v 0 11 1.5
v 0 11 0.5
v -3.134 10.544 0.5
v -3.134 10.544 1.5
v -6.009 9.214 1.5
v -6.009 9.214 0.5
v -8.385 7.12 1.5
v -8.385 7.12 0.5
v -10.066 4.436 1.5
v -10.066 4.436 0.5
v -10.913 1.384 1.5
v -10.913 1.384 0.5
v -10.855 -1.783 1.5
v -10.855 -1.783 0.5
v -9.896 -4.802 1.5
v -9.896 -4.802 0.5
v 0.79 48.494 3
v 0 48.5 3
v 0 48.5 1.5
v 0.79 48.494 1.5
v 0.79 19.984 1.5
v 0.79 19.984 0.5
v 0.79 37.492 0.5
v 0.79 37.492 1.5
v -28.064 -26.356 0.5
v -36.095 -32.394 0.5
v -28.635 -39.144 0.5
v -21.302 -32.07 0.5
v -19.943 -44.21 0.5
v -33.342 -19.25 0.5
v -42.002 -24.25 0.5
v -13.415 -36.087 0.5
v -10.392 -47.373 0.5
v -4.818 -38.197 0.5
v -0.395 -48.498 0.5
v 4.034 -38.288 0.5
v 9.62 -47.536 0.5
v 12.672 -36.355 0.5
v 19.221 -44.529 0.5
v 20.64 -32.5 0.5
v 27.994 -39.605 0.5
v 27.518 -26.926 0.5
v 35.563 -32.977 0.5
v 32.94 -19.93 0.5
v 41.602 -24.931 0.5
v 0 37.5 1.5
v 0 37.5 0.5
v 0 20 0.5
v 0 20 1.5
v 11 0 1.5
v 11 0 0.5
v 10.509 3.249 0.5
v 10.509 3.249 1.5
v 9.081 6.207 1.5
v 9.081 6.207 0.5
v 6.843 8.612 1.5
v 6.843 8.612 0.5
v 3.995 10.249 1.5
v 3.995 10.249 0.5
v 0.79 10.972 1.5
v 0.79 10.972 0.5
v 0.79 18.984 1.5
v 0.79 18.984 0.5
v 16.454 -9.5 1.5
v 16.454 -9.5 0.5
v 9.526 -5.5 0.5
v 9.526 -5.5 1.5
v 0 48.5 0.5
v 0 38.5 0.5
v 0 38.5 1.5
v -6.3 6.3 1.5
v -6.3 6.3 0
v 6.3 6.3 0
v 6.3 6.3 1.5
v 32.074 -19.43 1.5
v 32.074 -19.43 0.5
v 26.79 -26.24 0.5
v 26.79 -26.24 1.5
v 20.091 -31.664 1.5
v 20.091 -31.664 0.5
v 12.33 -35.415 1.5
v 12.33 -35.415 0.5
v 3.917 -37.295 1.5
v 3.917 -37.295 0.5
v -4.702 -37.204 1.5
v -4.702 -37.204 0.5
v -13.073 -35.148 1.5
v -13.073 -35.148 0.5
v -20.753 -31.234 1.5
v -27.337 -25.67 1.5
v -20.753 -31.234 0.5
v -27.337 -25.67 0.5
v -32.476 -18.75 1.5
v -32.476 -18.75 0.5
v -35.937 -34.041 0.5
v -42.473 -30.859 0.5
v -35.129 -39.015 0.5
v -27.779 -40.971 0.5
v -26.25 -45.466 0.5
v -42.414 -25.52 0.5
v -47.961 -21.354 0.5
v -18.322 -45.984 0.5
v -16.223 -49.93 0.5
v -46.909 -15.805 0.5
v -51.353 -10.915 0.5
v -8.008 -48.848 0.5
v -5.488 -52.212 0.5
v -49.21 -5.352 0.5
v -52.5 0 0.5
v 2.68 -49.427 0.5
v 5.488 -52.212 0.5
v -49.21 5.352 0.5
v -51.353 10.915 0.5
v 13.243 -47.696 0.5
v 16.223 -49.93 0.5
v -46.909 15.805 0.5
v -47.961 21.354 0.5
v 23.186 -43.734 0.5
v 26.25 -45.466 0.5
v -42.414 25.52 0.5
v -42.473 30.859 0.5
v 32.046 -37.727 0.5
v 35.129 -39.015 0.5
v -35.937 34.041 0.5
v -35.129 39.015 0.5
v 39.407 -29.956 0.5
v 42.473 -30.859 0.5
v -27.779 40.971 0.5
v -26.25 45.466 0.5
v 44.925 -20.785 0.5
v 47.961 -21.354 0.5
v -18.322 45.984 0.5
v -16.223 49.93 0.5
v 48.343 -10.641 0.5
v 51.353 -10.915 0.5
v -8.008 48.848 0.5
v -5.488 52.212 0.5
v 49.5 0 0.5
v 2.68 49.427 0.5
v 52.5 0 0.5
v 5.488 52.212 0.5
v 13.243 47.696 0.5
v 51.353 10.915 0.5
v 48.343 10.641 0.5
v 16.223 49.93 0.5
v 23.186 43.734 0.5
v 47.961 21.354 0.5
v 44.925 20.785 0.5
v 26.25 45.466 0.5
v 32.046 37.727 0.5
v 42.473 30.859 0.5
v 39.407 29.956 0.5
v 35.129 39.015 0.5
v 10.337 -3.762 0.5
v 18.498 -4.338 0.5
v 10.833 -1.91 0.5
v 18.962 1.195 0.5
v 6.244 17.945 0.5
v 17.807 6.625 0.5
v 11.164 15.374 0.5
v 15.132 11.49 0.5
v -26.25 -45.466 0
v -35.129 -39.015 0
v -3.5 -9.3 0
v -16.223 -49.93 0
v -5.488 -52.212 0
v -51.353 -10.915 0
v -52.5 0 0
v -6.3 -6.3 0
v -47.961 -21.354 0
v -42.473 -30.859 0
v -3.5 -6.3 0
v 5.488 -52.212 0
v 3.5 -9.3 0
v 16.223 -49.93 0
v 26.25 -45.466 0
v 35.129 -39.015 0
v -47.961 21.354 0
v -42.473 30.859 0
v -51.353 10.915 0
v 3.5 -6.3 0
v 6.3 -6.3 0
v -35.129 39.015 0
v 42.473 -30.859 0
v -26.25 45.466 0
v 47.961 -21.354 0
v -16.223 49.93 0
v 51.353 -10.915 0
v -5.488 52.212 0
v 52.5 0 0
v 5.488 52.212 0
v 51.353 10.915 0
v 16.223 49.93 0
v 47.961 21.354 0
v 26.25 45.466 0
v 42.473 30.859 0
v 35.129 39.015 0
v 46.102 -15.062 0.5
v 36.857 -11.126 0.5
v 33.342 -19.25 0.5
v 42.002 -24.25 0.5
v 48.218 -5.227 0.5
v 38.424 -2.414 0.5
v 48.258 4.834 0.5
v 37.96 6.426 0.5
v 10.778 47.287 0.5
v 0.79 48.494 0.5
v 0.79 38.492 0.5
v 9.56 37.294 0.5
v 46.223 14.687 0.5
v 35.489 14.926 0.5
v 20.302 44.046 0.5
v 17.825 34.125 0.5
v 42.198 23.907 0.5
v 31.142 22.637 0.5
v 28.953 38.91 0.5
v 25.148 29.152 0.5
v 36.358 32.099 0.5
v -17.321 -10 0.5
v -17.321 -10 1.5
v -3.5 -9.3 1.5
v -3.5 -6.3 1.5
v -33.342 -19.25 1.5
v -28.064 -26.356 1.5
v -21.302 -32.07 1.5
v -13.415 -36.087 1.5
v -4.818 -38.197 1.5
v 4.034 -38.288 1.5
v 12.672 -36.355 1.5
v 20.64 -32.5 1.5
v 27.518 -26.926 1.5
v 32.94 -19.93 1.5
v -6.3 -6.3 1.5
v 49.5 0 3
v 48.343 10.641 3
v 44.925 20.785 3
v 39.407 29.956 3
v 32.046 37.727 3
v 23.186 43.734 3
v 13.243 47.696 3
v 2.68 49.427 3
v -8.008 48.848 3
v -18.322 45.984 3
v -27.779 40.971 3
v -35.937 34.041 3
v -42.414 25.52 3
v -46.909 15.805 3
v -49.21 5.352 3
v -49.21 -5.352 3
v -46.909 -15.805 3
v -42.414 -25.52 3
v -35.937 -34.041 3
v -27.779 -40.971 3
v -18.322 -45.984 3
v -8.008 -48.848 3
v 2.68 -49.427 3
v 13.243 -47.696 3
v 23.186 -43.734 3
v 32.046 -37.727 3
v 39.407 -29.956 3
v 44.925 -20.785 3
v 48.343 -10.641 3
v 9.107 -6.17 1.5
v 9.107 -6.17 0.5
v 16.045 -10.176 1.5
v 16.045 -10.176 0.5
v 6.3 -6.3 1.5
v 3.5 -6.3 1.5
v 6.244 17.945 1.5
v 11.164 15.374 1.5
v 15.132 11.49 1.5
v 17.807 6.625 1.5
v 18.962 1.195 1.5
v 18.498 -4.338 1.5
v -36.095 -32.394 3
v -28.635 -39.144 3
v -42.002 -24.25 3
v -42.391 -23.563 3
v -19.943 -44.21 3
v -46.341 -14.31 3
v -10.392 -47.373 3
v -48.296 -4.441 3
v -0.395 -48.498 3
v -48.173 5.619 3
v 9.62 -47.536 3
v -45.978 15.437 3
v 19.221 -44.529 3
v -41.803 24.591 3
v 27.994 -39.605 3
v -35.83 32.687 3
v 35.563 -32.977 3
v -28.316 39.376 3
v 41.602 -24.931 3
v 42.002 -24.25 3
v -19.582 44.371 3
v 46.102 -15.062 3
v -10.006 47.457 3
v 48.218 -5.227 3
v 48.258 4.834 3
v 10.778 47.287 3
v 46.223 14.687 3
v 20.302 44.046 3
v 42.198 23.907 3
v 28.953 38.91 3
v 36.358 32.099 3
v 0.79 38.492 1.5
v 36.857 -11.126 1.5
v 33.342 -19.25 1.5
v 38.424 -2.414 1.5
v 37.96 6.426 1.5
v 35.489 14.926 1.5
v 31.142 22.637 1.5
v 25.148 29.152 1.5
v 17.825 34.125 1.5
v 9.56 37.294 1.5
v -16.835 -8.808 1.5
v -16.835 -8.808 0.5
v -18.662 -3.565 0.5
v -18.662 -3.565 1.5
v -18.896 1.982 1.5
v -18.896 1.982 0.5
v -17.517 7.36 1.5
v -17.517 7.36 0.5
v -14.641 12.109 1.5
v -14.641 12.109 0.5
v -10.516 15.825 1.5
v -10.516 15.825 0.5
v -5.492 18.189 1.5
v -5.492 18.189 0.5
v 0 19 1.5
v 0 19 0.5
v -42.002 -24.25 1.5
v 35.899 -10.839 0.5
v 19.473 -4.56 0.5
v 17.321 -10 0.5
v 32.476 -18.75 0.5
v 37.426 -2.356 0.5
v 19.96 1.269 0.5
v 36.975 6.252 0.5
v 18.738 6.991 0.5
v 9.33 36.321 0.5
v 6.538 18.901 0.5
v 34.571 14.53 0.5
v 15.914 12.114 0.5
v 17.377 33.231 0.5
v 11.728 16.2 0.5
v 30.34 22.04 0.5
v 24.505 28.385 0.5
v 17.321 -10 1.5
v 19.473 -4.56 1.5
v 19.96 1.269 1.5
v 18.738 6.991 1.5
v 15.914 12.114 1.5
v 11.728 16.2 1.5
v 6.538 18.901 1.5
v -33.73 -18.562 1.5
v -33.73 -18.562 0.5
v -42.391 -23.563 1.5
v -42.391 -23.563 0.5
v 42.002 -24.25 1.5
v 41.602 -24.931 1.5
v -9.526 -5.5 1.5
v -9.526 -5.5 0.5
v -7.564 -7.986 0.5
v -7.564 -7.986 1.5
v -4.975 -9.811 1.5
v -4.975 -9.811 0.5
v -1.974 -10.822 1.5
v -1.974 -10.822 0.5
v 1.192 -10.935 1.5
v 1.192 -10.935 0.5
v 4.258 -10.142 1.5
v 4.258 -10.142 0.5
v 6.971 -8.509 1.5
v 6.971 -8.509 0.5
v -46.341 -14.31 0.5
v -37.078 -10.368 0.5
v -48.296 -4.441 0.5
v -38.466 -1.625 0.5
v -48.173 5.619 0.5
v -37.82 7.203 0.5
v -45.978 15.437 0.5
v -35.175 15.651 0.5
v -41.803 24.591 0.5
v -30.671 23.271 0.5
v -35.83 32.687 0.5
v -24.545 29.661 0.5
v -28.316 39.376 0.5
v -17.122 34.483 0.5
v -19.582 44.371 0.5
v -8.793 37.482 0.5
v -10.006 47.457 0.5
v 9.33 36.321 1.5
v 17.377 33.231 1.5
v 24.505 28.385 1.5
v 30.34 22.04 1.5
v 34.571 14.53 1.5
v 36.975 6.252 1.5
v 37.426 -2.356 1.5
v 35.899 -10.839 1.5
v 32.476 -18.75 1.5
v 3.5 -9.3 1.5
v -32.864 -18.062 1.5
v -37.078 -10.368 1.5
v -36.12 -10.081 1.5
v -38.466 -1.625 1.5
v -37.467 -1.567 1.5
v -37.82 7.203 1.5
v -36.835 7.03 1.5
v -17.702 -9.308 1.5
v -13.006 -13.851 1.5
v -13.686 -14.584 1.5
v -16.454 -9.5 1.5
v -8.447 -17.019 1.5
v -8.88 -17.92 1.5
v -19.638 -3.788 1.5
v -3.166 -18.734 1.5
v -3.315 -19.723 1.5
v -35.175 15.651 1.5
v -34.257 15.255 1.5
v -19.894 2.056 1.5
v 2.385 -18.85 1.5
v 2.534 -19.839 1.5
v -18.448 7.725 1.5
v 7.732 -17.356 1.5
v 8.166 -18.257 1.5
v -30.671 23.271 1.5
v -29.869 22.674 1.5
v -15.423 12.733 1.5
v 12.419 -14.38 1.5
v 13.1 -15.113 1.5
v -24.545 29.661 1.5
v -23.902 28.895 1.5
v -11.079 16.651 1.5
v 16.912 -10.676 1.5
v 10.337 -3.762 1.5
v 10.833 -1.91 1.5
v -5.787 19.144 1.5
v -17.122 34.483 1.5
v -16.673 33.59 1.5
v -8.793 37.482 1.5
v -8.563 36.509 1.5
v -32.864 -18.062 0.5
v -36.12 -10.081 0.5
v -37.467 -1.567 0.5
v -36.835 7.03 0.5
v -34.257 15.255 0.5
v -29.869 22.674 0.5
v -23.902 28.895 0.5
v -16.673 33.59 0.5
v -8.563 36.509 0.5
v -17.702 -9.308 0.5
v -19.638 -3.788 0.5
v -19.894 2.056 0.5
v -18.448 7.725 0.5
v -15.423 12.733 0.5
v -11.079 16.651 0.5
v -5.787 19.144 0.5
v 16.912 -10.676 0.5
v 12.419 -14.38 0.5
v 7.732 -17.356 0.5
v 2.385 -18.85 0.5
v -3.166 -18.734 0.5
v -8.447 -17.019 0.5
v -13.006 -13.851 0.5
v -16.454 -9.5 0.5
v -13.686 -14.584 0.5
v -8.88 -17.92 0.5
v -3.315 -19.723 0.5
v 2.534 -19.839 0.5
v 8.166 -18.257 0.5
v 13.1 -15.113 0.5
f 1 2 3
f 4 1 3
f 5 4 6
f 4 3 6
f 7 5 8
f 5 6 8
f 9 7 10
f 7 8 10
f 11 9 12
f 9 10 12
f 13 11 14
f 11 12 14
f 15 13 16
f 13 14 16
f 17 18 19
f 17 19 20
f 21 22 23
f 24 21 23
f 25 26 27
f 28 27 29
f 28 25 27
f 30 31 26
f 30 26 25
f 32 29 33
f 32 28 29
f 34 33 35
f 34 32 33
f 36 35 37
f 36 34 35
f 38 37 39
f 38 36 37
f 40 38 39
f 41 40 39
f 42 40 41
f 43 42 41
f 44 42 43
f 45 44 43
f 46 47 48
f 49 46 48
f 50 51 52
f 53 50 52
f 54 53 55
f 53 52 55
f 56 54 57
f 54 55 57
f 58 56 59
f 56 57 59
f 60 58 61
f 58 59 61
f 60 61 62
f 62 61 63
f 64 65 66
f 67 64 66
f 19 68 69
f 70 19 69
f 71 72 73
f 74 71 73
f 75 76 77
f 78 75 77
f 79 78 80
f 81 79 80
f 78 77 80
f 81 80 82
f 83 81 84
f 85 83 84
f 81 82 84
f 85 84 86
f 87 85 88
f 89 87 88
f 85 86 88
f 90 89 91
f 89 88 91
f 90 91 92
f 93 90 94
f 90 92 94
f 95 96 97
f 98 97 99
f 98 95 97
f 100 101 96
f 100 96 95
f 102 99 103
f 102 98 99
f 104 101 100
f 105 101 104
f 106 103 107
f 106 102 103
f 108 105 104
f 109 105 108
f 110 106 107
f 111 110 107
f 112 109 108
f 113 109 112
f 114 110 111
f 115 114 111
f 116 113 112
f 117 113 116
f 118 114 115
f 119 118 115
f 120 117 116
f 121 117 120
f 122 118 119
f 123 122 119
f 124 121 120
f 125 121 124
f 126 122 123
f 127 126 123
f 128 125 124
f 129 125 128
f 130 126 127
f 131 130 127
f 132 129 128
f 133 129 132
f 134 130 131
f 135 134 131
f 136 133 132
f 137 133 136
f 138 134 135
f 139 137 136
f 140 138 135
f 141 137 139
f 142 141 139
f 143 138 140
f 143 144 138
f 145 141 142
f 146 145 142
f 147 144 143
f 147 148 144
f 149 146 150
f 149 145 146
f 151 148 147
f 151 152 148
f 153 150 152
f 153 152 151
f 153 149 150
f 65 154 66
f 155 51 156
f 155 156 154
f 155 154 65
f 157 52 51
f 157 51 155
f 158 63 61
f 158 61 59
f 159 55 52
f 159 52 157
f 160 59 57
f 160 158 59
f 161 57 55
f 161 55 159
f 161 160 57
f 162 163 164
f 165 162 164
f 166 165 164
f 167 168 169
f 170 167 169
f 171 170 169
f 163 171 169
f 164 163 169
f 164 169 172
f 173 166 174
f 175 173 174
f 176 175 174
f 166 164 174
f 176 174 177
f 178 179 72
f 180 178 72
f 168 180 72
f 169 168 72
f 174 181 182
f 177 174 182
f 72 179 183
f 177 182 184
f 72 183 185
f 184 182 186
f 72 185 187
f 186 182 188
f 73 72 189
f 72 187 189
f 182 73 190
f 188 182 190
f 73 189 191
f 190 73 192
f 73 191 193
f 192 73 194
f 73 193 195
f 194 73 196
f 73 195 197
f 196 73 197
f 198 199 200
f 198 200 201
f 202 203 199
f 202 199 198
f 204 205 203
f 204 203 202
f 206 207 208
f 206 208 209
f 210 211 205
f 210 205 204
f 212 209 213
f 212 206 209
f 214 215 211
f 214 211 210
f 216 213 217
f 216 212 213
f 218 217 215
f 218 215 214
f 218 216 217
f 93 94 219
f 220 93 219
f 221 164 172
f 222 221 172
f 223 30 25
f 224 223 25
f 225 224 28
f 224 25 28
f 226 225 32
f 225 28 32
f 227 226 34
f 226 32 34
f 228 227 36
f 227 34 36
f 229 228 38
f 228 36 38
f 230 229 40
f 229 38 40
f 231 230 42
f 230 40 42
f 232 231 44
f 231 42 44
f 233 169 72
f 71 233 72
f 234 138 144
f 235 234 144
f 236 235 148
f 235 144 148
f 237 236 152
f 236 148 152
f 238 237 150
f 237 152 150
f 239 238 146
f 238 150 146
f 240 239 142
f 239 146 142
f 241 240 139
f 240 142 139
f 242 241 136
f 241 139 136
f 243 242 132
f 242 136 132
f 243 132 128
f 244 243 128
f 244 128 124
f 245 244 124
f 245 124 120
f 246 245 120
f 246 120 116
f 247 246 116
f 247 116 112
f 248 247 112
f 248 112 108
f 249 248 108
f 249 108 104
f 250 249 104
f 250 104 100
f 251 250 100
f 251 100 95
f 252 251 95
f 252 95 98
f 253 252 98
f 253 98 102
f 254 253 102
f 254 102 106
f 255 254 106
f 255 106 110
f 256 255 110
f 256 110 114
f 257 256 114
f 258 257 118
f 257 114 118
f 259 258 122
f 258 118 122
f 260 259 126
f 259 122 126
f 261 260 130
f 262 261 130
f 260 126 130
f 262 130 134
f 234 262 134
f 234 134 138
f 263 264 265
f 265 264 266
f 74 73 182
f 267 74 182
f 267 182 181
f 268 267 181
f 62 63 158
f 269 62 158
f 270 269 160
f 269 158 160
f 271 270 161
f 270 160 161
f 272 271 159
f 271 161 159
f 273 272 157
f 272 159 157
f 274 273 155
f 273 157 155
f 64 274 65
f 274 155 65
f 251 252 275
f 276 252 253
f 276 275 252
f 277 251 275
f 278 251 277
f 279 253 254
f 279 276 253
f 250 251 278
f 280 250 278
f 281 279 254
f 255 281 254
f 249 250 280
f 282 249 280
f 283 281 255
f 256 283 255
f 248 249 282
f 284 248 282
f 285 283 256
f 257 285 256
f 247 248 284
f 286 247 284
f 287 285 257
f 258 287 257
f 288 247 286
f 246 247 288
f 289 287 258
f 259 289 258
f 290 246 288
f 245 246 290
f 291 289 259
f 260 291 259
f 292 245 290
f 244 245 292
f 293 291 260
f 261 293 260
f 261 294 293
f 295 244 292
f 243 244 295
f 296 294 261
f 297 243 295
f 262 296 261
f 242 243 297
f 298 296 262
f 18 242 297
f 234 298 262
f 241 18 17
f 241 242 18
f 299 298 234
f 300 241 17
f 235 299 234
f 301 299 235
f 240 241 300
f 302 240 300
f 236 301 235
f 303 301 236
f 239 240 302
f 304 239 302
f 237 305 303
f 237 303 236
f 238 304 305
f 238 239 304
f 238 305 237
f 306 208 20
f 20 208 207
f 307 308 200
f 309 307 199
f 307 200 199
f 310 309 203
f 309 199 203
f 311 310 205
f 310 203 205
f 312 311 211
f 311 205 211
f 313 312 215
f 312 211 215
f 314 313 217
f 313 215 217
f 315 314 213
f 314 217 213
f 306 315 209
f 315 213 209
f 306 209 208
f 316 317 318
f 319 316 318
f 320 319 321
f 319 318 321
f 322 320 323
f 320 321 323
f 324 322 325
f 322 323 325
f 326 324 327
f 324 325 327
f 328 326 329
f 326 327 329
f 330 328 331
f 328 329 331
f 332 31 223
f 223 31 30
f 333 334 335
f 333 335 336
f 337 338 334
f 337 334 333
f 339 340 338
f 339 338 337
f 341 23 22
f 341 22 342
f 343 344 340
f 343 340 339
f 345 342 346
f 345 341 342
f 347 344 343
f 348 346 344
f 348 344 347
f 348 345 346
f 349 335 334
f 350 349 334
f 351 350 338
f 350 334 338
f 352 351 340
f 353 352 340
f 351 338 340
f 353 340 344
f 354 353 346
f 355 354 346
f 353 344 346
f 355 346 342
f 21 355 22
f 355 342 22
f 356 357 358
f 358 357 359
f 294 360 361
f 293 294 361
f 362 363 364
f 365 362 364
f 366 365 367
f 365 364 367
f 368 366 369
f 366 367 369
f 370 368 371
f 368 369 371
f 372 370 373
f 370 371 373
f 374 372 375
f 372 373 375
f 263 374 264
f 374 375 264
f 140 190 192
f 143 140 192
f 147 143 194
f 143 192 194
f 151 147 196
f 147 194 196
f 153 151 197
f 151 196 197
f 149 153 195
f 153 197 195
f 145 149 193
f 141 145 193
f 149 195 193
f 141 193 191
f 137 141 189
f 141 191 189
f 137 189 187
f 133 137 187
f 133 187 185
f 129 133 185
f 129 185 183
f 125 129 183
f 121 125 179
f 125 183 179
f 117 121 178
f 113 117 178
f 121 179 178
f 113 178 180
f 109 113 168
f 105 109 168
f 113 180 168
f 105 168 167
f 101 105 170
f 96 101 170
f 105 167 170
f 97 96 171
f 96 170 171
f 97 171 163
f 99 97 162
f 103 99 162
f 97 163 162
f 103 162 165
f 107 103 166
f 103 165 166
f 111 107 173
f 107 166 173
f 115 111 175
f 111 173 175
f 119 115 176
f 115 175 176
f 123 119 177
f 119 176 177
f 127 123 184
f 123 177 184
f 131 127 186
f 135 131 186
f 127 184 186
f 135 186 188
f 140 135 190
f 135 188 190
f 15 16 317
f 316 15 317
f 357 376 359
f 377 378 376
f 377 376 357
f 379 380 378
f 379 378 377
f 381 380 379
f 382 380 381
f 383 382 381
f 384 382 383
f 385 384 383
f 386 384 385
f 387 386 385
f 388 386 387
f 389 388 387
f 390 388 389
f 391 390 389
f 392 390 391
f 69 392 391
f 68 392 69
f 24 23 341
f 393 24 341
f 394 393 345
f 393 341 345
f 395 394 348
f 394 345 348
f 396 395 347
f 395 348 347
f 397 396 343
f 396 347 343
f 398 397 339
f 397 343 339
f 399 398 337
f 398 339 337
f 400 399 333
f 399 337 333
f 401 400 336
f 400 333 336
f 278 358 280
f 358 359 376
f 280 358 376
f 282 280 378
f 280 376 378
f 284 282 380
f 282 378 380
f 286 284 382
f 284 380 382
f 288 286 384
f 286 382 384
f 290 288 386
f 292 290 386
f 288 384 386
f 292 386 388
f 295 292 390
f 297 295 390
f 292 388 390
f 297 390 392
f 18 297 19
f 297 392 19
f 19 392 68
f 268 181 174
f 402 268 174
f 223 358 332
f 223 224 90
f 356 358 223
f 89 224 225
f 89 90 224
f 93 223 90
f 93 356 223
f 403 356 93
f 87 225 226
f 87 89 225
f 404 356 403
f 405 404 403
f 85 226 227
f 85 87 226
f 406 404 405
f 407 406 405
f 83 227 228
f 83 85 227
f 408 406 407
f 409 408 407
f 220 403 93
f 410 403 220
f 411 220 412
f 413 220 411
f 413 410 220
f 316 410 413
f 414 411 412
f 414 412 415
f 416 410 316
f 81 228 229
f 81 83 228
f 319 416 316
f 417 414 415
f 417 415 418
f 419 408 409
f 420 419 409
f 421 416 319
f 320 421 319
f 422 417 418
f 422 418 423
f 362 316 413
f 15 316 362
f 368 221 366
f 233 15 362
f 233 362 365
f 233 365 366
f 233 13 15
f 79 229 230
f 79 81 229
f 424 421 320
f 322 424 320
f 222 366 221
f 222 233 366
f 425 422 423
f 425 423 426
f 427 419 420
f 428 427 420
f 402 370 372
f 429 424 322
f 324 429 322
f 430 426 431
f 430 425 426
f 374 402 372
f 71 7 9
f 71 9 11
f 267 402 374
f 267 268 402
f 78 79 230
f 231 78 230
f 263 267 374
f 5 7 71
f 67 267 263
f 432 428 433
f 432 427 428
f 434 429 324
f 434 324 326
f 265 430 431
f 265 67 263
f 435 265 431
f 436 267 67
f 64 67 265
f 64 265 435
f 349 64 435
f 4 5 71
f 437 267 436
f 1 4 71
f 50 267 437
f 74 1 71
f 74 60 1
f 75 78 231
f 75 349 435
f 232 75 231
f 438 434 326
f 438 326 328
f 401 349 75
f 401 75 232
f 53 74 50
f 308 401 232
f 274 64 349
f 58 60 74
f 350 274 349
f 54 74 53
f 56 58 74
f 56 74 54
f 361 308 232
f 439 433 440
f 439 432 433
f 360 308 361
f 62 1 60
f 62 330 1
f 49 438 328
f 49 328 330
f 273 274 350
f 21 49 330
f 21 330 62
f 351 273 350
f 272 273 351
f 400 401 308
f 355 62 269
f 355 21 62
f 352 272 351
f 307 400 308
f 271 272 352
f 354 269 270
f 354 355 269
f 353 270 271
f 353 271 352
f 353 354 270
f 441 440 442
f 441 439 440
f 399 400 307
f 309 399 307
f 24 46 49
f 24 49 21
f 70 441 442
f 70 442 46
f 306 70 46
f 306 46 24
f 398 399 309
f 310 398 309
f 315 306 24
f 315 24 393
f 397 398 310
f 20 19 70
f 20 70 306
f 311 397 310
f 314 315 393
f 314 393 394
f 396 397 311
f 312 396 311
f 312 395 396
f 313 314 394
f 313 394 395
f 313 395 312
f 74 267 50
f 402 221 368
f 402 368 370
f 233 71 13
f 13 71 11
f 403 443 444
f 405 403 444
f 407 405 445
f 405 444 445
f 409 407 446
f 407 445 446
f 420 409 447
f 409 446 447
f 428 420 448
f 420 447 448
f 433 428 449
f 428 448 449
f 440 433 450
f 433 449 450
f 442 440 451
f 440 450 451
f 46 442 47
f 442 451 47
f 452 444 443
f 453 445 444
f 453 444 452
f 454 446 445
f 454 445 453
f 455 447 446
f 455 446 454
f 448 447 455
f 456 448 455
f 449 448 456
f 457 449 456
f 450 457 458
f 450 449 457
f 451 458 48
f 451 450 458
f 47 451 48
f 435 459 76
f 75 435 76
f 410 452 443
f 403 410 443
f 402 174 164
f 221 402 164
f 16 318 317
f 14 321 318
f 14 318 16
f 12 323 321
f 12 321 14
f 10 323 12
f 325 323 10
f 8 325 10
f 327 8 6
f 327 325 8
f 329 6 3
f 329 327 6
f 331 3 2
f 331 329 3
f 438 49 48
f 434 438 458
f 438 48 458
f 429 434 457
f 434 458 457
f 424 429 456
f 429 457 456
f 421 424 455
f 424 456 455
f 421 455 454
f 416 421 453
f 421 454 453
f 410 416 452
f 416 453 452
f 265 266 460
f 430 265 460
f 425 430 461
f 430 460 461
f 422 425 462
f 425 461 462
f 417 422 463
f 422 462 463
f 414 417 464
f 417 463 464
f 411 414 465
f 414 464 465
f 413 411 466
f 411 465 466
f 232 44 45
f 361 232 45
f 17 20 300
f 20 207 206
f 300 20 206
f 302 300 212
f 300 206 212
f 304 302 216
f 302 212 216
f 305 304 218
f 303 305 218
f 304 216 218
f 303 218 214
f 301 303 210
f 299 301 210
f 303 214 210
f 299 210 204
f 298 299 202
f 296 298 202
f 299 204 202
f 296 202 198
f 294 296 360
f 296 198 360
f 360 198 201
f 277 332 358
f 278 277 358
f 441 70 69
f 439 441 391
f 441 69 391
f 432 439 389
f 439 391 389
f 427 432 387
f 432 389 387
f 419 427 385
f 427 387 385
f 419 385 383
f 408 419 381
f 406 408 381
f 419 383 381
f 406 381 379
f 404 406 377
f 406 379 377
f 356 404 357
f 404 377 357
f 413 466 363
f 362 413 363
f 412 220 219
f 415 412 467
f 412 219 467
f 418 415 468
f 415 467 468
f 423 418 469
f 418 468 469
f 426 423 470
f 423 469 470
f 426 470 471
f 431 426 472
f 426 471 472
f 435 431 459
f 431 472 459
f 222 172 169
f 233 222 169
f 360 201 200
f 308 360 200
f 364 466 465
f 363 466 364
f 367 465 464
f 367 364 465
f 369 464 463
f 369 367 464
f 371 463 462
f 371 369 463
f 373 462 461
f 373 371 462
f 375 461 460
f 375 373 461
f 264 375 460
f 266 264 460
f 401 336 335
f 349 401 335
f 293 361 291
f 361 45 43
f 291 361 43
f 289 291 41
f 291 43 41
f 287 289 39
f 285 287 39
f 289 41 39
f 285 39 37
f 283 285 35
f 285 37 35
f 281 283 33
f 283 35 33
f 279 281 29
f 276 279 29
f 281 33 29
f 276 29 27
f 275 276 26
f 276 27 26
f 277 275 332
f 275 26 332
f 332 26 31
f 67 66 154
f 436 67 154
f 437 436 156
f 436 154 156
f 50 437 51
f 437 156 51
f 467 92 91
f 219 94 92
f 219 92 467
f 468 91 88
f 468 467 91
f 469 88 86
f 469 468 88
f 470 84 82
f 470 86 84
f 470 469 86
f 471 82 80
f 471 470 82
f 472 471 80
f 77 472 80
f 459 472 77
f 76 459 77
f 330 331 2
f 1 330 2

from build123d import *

# Parameters (mm, degrees)
F0_R     = 52.5
F0_R_2   = 49.5
F1_DEPTH = 0.5
F2_DEPTH = 3
F3_DEPTH = 1.5


# Not quite as in the source:
# - a feature names something its author has since deleted; it is built from what else it names


with BuildPart() as f1:
    # F0 (on Top) → F1 (new body)
    with BuildSketch(Plane.XY):
        Circle(F0_R)
        Circle(F0_R_2, mode=Mode.SUBTRACT)
        Circle(F0_R_2)
        with BuildLine():
            ThreePointArc((-42.3914543736, -23.5629920869), (-41.8034395488, 24.5911049344), (0, 48.5))
            Line((0, 48.5), (0.7895774504, 48.4935724344))
            ThreePointArc((0.7895774504, 48.4935724344), (42.1982413547, 23.9072881476), (42.0022320835, -24.25))
            Line((42.0022320835, -24.25), (41.6018769232, -24.9305803475))
            ThreePointArc((41.6018769232, -24.9305803475), (-0.3948018059, -48.498393082), (-42.0022320835, -24.25))
            Line((-42.0022320835, -24.25), (-42.3914543736, -23.5629920869))
        make_face(mode=Mode.SUBTRACT)
        with BuildLine():
            Line((0.7895774504, 48.4935724344), (0, 48.5))
            Line((0, 48.5), (0, 38.5))
            ThreePointArc((0, 38.5), (-33.1428201233, 19.5909028448), (-33.7297542357, -18.5621571806))
            Line((-33.7297542357, -18.5621571806), (-42.3914543736, -23.5629920869))
            Line((-42.3914543736, -23.5629920869), (-42.0022320835, -24.25))
            Line((-42.0022320835, -24.25), (-33.3419780457, -19.25))
            ThreePointArc((-33.3419780457, -19.25), (-0.394809485, -38.4979756022), (32.9401767853, -19.9297454412))
            Line((32.9401767853, -19.9297454412), (41.6018769232, -24.9305803475))
            Line((41.6018769232, -24.9305803475), (42.0022320835, -24.25))
            Line((42.0022320835, -24.25), (33.3419780457, -19.25))
            ThreePointArc((33.3419780457, -19.25), (33.5376296083, 18.9070727575), (0.7895774504, 38.4919026218))
            Line((0.7895774504, 38.4919026218), (0.7895774504, 48.4935724344))
        make_face()
        with BuildLine():
            ThreePointArc((32.0739643397, -19.4296374526), (-0.3948106071, -37.4979216035), (-32.4759526419, -18.75))
            Line((-32.4759526419, -18.75), (-17.3205080757, -10))
            ThreePointArc((-17.3205080757, -10), (-0.3948656915, -19.9961016472), (16.9122163764, -10.6759981846))
            Line((16.9122163764, -10.6759981846), (32.0739643397, -19.4296374526))
        make_face(mode=Mode.SUBTRACT)
        with BuildLine():
            Line((-17.7017938268, -9.308409924), (-32.8635417901, -18.0620491919))
            ThreePointArc((-32.8635417901, -18.0620491919), (-32.2767473942, 19.0908768172), (0, 37.5))
            Line((0, 37.5), (0, 20))
            ThreePointArc((0, 20), (-17.1196991574, 10.3400145435), (-17.7017938268, -9.308409924))
        make_face(mode=Mode.SUBTRACT)
        with BuildLine():
            ThreePointArc((0, 11), (0.3950435606, 10.9929041015), (0.7895774504, 10.971625561))
            Line((0.7895774504, 10.971625561), (0.7895774504, 18.983586791))
            ThreePointArc((0.7895774504, 18.983586791), (16.6483657305, 9.155977201), (16.4544826719, -9.5))
            Line((16.4544826719, -9.5), (9.5262794416, -5.5))
            ThreePointArc((9.5262794416, -5.5), (9.322612433, -5.8385698098), (9.1069177314, -6.1696069108))
            Line((9.1069177314, -6.1696069108), (16.0454796907, -10.1755875258))
            ThreePointArc((16.0454796907, -10.1755875258), (-0.3948740127, -18.9958962546), (-16.4544826719, -9.5))
            Line((-16.4544826719, -9.5), (-9.5262794416, -5.5))
            ThreePointArc((-9.5262794416, -5.5), (-9.7176559936, -5.1543342917), (-9.8964951818, -4.8020186502))
            Line((-9.8964951818, -4.8020186502), (-16.8350571411, -8.8079992652))
            ThreePointArc((-16.8350571411, -8.8079992652), (-16.2534917178, 9.8399190536), (0, 19))
            Line((0, 19), (0, 11))
        make_face(mode=Mode.SUBTRACT)
        with BuildLine():
            Line((32.4759526419, -18.75), (17.3205080757, -10))
            ThreePointArc((17.3205080757, -10), (17.5145648489, 9.6560871037), (0.7895774504, 19.9844081086))
            Line((0.7895774504, 19.9844081086), (0.7895774504, 37.4916866445))
            ThreePointArc((0.7895774504, 37.4916866445), (32.6715580013, 18.4070447863), (32.4759526419, -18.75))
        make_face(mode=Mode.SUBTRACT)
        with BuildLine():
            Line((-17.3205080757, -10), (-32.4759526419, -18.75))
            ThreePointArc((-32.4759526419, -18.75), (-0.3948106071, -37.4979216035), (32.0739643397, -19.4296374526))
            Line((32.0739643397, -19.4296374526), (16.9122163764, -10.6759981846))
            ThreePointArc((16.9122163764, -10.6759981846), (-0.3948656915, -19.9961016472), (-17.3205080757, -10))
        make_face()
        with BuildLine():
            ThreePointArc((0, 37.5), (-32.2767473942, 19.0908768172), (-32.8635417901, -18.0620491919))
            Line((-32.8635417901, -18.0620491919), (-17.7017938268, -9.308409924))
            ThreePointArc((-17.7017938268, -9.308409924), (-17.1196991574, 10.3400145435), (0, 20))
            Line((0, 20), (0, 37.5))
        make_face()
        with BuildLine():
            ThreePointArc((0.7895774504, 19.9844081086), (17.5145648489, 9.6560871037), (17.3205080757, -10))
            Line((17.3205080757, -10), (32.4759526419, -18.75))
            ThreePointArc((32.4759526419, -18.75), (32.6715580013, 18.4070447863), (0.7895774504, 37.4916866445))
            Line((0.7895774504, 37.4916866445), (0.7895774504, 19.9844081086))
        make_face()
        with BuildLine():
            Line((0, 38.5), (0, 48.5))
            ThreePointArc((0, 48.5), (-41.8034395488, 24.5911049344), (-42.3914543736, -23.5629920869))
            Line((-42.3914543736, -23.5629920869), (-33.7297542357, -18.5621571806))
            ThreePointArc((-33.7297542357, -18.5621571806), (-33.1428201233, 19.5909028448), (0, 38.5))
        make_face()
        with BuildLine():
            ThreePointArc((42.0022320835, -24.25), (42.1982413547, 23.9072881476), (0.7895774504, 48.4935724344))
            Line((0.7895774504, 48.4935724344), (0.7895774504, 38.4919026218))
            ThreePointArc((0.7895774504, 38.4919026218), (33.5376296083, 18.9070727575), (33.3419780457, -19.25))
            Line((33.3419780457, -19.25), (42.0022320835, -24.25))
        make_face()
        with BuildLine():
            Line((-33.3419780457, -19.25), (-42.0022320835, -24.25))
            ThreePointArc((-42.0022320835, -24.25), (-0.3948018059, -48.498393082), (41.6018769232, -24.9305803475))
            Line((41.6018769232, -24.9305803475), (32.9401767853, -19.9297454412))
            ThreePointArc((32.9401767853, -19.9297454412), (-0.394809485, -38.4979756022), (-33.3419780457, -19.25))
        make_face()
        with BuildLine():
            ThreePointArc((9.5262794416, -5.5), (10.6251840892, -2.8470094961), (11, 0))
            ThreePointArc((11, 0), (8.0524950157, 7.4938190546), (0.7895774504, 10.971625561))
            ThreePointArc((0.7895774504, 10.971625561), (0.3950435606, 10.9929041015), (0, 11))
            ThreePointArc((0, 11), (-9.322612433, 5.8385698098), (-9.8964951818, -4.8020186502))
            ThreePointArc((-9.8964951818, -4.8020186502), (-9.7176559936, -5.1543342917), (-9.5262794416, -5.5))
            ThreePointArc((-9.5262794416, -5.5), (-0.3950435606, -10.9929041015), (9.1069177314, -6.1696069108))
            ThreePointArc((9.1069177314, -6.1696069108), (9.322612433, -5.8385698098), (9.5262794416, -5.5))
        make_face()
        Polygon((6.3, 6.3), (6.3, -6.3), (3.5, -6.3), (3.5, -9.3), (-3.5, -9.3), (-3.5, -6.3), (-6.3, -6.3), (-6.3, 6.3), align=None, mode=Mode.SUBTRACT)
        with BuildLine():
            ThreePointArc((0.7895774504, 10.971625561), (8.0524950157, 7.4938190546), (11, 0))
            ThreePointArc((11, 0), (10.6251840892, -2.8470094961), (9.5262794416, -5.5))
            Line((9.5262794416, -5.5), (16.4544826719, -9.5))
            ThreePointArc((16.4544826719, -9.5), (16.6483657305, 9.155977201), (0.7895774504, 18.983586791))
            Line((0.7895774504, 18.983586791), (0.7895774504, 10.971625561))
        make_face()
        with BuildLine():
            ThreePointArc((-9.8964951818, -4.8020186502), (-9.322612433, 5.8385698098), (0, 11))
            Line((0, 11), (0, 19))
            ThreePointArc((0, 19), (-16.2534917178, 9.8399190536), (-16.8350571411, -8.8079992652))
            Line((-16.8350571411, -8.8079992652), (-9.8964951818, -4.8020186502))
        make_face()
        with BuildLine():
            Line((16.0454796907, -10.1755875258), (9.1069177314, -6.1696069108))
            ThreePointArc((9.1069177314, -6.1696069108), (-0.3950435606, -10.9929041015), (-9.5262794416, -5.5))
            Line((-9.5262794416, -5.5), (-16.4544826719, -9.5))
            ThreePointArc((-16.4544826719, -9.5), (-0.3948740127, -18.9958962546), (16.0454796907, -10.1755875258))
        make_face()
    extrude(amount=F1_DEPTH)

    # F0 (on Top) → F2 (join)
    with BuildSketch(Plane.XY):
        Circle(F0_R_2)
        with BuildLine():
            ThreePointArc((-42.3914543736, -23.5629920869), (-41.8034395488, 24.5911049344), (0, 48.5))
            Line((0, 48.5), (0.7895774504, 48.4935724344))
            ThreePointArc((0.7895774504, 48.4935724344), (42.1982413547, 23.9072881476), (42.0022320835, -24.25))
            Line((42.0022320835, -24.25), (41.6018769232, -24.9305803475))
            ThreePointArc((41.6018769232, -24.9305803475), (-0.3948018059, -48.498393082), (-42.0022320835, -24.25))
            Line((-42.0022320835, -24.25), (-42.3914543736, -23.5629920869))
        make_face(mode=Mode.SUBTRACT)
    extrude(amount=F2_DEPTH)

    # F0 (on Top) → F3 (join)
    with BuildSketch(Plane.XY):
        with BuildLine():
            Line((0.7895774504, 48.4935724344), (0, 48.5))
            Line((0, 48.5), (0, 38.5))
            ThreePointArc((0, 38.5), (-33.1428201233, 19.5909028448), (-33.7297542357, -18.5621571806))
            Line((-33.7297542357, -18.5621571806), (-42.3914543736, -23.5629920869))
            Line((-42.3914543736, -23.5629920869), (-42.0022320835, -24.25))
            Line((-42.0022320835, -24.25), (-33.3419780457, -19.25))
            ThreePointArc((-33.3419780457, -19.25), (-0.394809485, -38.4979756022), (32.9401767853, -19.9297454412))
            Line((32.9401767853, -19.9297454412), (41.6018769232, -24.9305803475))
            Line((41.6018769232, -24.9305803475), (42.0022320835, -24.25))
            Line((42.0022320835, -24.25), (33.3419780457, -19.25))
            ThreePointArc((33.3419780457, -19.25), (33.5376296083, 18.9070727575), (0.7895774504, 38.4919026218))
            Line((0.7895774504, 38.4919026218), (0.7895774504, 48.4935724344))
        make_face()
        with BuildLine():
            ThreePointArc((32.0739643397, -19.4296374526), (-0.3948106071, -37.4979216035), (-32.4759526419, -18.75))
            Line((-32.4759526419, -18.75), (-17.3205080757, -10))
            ThreePointArc((-17.3205080757, -10), (-0.3948656915, -19.9961016472), (16.9122163764, -10.6759981846))
            Line((16.9122163764, -10.6759981846), (32.0739643397, -19.4296374526))
        make_face(mode=Mode.SUBTRACT)
        with BuildLine():
            Line((-17.7017938268, -9.308409924), (-32.8635417901, -18.0620491919))
            ThreePointArc((-32.8635417901, -18.0620491919), (-32.2767473942, 19.0908768172), (0, 37.5))
            Line((0, 37.5), (0, 20))
            ThreePointArc((0, 20), (-17.1196991574, 10.3400145435), (-17.7017938268, -9.308409924))
        make_face(mode=Mode.SUBTRACT)
        with BuildLine():
            ThreePointArc((0, 11), (0.3950435606, 10.9929041015), (0.7895774504, 10.971625561))
            Line((0.7895774504, 10.971625561), (0.7895774504, 18.983586791))
            ThreePointArc((0.7895774504, 18.983586791), (16.6483657305, 9.155977201), (16.4544826719, -9.5))
            Line((16.4544826719, -9.5), (9.5262794416, -5.5))
            ThreePointArc((9.5262794416, -5.5), (9.322612433, -5.8385698098), (9.1069177314, -6.1696069108))
            Line((9.1069177314, -6.1696069108), (16.0454796907, -10.1755875258))
            ThreePointArc((16.0454796907, -10.1755875258), (-0.3948740127, -18.9958962546), (-16.4544826719, -9.5))
            Line((-16.4544826719, -9.5), (-9.5262794416, -5.5))
            ThreePointArc((-9.5262794416, -5.5), (-9.7176559936, -5.1543342917), (-9.8964951818, -4.8020186502))
            Line((-9.8964951818, -4.8020186502), (-16.8350571411, -8.8079992652))
            ThreePointArc((-16.8350571411, -8.8079992652), (-16.2534917178, 9.8399190536), (0, 19))
            Line((0, 19), (0, 11))
        make_face(mode=Mode.SUBTRACT)
        with BuildLine():
            Line((32.4759526419, -18.75), (17.3205080757, -10))
            ThreePointArc((17.3205080757, -10), (17.5145648489, 9.6560871037), (0.7895774504, 19.9844081086))
            Line((0.7895774504, 19.9844081086), (0.7895774504, 37.4916866445))
            ThreePointArc((0.7895774504, 37.4916866445), (32.6715580013, 18.4070447863), (32.4759526419, -18.75))
        make_face(mode=Mode.SUBTRACT)
        with BuildLine():
            ThreePointArc((9.5262794416, -5.5), (10.6251840892, -2.8470094961), (11, 0))
            ThreePointArc((11, 0), (8.0524950157, 7.4938190546), (0.7895774504, 10.971625561))
            ThreePointArc((0.7895774504, 10.971625561), (0.3950435606, 10.9929041015), (0, 11))
            ThreePointArc((0, 11), (-9.322612433, 5.8385698098), (-9.8964951818, -4.8020186502))
            ThreePointArc((-9.8964951818, -4.8020186502), (-9.7176559936, -5.1543342917), (-9.5262794416, -5.5))
            ThreePointArc((-9.5262794416, -5.5), (-0.3950435606, -10.9929041015), (9.1069177314, -6.1696069108))
            ThreePointArc((9.1069177314, -6.1696069108), (9.322612433, -5.8385698098), (9.5262794416, -5.5))
        make_face()
        Polygon((6.3, 6.3), (6.3, -6.3), (3.5, -6.3), (3.5, -9.3), (-3.5, -9.3), (-3.5, -6.3), (-6.3, -6.3), (-6.3, 6.3), align=None, mode=Mode.SUBTRACT)
    extrude(amount=F3_DEPTH)


solid = f1.part
